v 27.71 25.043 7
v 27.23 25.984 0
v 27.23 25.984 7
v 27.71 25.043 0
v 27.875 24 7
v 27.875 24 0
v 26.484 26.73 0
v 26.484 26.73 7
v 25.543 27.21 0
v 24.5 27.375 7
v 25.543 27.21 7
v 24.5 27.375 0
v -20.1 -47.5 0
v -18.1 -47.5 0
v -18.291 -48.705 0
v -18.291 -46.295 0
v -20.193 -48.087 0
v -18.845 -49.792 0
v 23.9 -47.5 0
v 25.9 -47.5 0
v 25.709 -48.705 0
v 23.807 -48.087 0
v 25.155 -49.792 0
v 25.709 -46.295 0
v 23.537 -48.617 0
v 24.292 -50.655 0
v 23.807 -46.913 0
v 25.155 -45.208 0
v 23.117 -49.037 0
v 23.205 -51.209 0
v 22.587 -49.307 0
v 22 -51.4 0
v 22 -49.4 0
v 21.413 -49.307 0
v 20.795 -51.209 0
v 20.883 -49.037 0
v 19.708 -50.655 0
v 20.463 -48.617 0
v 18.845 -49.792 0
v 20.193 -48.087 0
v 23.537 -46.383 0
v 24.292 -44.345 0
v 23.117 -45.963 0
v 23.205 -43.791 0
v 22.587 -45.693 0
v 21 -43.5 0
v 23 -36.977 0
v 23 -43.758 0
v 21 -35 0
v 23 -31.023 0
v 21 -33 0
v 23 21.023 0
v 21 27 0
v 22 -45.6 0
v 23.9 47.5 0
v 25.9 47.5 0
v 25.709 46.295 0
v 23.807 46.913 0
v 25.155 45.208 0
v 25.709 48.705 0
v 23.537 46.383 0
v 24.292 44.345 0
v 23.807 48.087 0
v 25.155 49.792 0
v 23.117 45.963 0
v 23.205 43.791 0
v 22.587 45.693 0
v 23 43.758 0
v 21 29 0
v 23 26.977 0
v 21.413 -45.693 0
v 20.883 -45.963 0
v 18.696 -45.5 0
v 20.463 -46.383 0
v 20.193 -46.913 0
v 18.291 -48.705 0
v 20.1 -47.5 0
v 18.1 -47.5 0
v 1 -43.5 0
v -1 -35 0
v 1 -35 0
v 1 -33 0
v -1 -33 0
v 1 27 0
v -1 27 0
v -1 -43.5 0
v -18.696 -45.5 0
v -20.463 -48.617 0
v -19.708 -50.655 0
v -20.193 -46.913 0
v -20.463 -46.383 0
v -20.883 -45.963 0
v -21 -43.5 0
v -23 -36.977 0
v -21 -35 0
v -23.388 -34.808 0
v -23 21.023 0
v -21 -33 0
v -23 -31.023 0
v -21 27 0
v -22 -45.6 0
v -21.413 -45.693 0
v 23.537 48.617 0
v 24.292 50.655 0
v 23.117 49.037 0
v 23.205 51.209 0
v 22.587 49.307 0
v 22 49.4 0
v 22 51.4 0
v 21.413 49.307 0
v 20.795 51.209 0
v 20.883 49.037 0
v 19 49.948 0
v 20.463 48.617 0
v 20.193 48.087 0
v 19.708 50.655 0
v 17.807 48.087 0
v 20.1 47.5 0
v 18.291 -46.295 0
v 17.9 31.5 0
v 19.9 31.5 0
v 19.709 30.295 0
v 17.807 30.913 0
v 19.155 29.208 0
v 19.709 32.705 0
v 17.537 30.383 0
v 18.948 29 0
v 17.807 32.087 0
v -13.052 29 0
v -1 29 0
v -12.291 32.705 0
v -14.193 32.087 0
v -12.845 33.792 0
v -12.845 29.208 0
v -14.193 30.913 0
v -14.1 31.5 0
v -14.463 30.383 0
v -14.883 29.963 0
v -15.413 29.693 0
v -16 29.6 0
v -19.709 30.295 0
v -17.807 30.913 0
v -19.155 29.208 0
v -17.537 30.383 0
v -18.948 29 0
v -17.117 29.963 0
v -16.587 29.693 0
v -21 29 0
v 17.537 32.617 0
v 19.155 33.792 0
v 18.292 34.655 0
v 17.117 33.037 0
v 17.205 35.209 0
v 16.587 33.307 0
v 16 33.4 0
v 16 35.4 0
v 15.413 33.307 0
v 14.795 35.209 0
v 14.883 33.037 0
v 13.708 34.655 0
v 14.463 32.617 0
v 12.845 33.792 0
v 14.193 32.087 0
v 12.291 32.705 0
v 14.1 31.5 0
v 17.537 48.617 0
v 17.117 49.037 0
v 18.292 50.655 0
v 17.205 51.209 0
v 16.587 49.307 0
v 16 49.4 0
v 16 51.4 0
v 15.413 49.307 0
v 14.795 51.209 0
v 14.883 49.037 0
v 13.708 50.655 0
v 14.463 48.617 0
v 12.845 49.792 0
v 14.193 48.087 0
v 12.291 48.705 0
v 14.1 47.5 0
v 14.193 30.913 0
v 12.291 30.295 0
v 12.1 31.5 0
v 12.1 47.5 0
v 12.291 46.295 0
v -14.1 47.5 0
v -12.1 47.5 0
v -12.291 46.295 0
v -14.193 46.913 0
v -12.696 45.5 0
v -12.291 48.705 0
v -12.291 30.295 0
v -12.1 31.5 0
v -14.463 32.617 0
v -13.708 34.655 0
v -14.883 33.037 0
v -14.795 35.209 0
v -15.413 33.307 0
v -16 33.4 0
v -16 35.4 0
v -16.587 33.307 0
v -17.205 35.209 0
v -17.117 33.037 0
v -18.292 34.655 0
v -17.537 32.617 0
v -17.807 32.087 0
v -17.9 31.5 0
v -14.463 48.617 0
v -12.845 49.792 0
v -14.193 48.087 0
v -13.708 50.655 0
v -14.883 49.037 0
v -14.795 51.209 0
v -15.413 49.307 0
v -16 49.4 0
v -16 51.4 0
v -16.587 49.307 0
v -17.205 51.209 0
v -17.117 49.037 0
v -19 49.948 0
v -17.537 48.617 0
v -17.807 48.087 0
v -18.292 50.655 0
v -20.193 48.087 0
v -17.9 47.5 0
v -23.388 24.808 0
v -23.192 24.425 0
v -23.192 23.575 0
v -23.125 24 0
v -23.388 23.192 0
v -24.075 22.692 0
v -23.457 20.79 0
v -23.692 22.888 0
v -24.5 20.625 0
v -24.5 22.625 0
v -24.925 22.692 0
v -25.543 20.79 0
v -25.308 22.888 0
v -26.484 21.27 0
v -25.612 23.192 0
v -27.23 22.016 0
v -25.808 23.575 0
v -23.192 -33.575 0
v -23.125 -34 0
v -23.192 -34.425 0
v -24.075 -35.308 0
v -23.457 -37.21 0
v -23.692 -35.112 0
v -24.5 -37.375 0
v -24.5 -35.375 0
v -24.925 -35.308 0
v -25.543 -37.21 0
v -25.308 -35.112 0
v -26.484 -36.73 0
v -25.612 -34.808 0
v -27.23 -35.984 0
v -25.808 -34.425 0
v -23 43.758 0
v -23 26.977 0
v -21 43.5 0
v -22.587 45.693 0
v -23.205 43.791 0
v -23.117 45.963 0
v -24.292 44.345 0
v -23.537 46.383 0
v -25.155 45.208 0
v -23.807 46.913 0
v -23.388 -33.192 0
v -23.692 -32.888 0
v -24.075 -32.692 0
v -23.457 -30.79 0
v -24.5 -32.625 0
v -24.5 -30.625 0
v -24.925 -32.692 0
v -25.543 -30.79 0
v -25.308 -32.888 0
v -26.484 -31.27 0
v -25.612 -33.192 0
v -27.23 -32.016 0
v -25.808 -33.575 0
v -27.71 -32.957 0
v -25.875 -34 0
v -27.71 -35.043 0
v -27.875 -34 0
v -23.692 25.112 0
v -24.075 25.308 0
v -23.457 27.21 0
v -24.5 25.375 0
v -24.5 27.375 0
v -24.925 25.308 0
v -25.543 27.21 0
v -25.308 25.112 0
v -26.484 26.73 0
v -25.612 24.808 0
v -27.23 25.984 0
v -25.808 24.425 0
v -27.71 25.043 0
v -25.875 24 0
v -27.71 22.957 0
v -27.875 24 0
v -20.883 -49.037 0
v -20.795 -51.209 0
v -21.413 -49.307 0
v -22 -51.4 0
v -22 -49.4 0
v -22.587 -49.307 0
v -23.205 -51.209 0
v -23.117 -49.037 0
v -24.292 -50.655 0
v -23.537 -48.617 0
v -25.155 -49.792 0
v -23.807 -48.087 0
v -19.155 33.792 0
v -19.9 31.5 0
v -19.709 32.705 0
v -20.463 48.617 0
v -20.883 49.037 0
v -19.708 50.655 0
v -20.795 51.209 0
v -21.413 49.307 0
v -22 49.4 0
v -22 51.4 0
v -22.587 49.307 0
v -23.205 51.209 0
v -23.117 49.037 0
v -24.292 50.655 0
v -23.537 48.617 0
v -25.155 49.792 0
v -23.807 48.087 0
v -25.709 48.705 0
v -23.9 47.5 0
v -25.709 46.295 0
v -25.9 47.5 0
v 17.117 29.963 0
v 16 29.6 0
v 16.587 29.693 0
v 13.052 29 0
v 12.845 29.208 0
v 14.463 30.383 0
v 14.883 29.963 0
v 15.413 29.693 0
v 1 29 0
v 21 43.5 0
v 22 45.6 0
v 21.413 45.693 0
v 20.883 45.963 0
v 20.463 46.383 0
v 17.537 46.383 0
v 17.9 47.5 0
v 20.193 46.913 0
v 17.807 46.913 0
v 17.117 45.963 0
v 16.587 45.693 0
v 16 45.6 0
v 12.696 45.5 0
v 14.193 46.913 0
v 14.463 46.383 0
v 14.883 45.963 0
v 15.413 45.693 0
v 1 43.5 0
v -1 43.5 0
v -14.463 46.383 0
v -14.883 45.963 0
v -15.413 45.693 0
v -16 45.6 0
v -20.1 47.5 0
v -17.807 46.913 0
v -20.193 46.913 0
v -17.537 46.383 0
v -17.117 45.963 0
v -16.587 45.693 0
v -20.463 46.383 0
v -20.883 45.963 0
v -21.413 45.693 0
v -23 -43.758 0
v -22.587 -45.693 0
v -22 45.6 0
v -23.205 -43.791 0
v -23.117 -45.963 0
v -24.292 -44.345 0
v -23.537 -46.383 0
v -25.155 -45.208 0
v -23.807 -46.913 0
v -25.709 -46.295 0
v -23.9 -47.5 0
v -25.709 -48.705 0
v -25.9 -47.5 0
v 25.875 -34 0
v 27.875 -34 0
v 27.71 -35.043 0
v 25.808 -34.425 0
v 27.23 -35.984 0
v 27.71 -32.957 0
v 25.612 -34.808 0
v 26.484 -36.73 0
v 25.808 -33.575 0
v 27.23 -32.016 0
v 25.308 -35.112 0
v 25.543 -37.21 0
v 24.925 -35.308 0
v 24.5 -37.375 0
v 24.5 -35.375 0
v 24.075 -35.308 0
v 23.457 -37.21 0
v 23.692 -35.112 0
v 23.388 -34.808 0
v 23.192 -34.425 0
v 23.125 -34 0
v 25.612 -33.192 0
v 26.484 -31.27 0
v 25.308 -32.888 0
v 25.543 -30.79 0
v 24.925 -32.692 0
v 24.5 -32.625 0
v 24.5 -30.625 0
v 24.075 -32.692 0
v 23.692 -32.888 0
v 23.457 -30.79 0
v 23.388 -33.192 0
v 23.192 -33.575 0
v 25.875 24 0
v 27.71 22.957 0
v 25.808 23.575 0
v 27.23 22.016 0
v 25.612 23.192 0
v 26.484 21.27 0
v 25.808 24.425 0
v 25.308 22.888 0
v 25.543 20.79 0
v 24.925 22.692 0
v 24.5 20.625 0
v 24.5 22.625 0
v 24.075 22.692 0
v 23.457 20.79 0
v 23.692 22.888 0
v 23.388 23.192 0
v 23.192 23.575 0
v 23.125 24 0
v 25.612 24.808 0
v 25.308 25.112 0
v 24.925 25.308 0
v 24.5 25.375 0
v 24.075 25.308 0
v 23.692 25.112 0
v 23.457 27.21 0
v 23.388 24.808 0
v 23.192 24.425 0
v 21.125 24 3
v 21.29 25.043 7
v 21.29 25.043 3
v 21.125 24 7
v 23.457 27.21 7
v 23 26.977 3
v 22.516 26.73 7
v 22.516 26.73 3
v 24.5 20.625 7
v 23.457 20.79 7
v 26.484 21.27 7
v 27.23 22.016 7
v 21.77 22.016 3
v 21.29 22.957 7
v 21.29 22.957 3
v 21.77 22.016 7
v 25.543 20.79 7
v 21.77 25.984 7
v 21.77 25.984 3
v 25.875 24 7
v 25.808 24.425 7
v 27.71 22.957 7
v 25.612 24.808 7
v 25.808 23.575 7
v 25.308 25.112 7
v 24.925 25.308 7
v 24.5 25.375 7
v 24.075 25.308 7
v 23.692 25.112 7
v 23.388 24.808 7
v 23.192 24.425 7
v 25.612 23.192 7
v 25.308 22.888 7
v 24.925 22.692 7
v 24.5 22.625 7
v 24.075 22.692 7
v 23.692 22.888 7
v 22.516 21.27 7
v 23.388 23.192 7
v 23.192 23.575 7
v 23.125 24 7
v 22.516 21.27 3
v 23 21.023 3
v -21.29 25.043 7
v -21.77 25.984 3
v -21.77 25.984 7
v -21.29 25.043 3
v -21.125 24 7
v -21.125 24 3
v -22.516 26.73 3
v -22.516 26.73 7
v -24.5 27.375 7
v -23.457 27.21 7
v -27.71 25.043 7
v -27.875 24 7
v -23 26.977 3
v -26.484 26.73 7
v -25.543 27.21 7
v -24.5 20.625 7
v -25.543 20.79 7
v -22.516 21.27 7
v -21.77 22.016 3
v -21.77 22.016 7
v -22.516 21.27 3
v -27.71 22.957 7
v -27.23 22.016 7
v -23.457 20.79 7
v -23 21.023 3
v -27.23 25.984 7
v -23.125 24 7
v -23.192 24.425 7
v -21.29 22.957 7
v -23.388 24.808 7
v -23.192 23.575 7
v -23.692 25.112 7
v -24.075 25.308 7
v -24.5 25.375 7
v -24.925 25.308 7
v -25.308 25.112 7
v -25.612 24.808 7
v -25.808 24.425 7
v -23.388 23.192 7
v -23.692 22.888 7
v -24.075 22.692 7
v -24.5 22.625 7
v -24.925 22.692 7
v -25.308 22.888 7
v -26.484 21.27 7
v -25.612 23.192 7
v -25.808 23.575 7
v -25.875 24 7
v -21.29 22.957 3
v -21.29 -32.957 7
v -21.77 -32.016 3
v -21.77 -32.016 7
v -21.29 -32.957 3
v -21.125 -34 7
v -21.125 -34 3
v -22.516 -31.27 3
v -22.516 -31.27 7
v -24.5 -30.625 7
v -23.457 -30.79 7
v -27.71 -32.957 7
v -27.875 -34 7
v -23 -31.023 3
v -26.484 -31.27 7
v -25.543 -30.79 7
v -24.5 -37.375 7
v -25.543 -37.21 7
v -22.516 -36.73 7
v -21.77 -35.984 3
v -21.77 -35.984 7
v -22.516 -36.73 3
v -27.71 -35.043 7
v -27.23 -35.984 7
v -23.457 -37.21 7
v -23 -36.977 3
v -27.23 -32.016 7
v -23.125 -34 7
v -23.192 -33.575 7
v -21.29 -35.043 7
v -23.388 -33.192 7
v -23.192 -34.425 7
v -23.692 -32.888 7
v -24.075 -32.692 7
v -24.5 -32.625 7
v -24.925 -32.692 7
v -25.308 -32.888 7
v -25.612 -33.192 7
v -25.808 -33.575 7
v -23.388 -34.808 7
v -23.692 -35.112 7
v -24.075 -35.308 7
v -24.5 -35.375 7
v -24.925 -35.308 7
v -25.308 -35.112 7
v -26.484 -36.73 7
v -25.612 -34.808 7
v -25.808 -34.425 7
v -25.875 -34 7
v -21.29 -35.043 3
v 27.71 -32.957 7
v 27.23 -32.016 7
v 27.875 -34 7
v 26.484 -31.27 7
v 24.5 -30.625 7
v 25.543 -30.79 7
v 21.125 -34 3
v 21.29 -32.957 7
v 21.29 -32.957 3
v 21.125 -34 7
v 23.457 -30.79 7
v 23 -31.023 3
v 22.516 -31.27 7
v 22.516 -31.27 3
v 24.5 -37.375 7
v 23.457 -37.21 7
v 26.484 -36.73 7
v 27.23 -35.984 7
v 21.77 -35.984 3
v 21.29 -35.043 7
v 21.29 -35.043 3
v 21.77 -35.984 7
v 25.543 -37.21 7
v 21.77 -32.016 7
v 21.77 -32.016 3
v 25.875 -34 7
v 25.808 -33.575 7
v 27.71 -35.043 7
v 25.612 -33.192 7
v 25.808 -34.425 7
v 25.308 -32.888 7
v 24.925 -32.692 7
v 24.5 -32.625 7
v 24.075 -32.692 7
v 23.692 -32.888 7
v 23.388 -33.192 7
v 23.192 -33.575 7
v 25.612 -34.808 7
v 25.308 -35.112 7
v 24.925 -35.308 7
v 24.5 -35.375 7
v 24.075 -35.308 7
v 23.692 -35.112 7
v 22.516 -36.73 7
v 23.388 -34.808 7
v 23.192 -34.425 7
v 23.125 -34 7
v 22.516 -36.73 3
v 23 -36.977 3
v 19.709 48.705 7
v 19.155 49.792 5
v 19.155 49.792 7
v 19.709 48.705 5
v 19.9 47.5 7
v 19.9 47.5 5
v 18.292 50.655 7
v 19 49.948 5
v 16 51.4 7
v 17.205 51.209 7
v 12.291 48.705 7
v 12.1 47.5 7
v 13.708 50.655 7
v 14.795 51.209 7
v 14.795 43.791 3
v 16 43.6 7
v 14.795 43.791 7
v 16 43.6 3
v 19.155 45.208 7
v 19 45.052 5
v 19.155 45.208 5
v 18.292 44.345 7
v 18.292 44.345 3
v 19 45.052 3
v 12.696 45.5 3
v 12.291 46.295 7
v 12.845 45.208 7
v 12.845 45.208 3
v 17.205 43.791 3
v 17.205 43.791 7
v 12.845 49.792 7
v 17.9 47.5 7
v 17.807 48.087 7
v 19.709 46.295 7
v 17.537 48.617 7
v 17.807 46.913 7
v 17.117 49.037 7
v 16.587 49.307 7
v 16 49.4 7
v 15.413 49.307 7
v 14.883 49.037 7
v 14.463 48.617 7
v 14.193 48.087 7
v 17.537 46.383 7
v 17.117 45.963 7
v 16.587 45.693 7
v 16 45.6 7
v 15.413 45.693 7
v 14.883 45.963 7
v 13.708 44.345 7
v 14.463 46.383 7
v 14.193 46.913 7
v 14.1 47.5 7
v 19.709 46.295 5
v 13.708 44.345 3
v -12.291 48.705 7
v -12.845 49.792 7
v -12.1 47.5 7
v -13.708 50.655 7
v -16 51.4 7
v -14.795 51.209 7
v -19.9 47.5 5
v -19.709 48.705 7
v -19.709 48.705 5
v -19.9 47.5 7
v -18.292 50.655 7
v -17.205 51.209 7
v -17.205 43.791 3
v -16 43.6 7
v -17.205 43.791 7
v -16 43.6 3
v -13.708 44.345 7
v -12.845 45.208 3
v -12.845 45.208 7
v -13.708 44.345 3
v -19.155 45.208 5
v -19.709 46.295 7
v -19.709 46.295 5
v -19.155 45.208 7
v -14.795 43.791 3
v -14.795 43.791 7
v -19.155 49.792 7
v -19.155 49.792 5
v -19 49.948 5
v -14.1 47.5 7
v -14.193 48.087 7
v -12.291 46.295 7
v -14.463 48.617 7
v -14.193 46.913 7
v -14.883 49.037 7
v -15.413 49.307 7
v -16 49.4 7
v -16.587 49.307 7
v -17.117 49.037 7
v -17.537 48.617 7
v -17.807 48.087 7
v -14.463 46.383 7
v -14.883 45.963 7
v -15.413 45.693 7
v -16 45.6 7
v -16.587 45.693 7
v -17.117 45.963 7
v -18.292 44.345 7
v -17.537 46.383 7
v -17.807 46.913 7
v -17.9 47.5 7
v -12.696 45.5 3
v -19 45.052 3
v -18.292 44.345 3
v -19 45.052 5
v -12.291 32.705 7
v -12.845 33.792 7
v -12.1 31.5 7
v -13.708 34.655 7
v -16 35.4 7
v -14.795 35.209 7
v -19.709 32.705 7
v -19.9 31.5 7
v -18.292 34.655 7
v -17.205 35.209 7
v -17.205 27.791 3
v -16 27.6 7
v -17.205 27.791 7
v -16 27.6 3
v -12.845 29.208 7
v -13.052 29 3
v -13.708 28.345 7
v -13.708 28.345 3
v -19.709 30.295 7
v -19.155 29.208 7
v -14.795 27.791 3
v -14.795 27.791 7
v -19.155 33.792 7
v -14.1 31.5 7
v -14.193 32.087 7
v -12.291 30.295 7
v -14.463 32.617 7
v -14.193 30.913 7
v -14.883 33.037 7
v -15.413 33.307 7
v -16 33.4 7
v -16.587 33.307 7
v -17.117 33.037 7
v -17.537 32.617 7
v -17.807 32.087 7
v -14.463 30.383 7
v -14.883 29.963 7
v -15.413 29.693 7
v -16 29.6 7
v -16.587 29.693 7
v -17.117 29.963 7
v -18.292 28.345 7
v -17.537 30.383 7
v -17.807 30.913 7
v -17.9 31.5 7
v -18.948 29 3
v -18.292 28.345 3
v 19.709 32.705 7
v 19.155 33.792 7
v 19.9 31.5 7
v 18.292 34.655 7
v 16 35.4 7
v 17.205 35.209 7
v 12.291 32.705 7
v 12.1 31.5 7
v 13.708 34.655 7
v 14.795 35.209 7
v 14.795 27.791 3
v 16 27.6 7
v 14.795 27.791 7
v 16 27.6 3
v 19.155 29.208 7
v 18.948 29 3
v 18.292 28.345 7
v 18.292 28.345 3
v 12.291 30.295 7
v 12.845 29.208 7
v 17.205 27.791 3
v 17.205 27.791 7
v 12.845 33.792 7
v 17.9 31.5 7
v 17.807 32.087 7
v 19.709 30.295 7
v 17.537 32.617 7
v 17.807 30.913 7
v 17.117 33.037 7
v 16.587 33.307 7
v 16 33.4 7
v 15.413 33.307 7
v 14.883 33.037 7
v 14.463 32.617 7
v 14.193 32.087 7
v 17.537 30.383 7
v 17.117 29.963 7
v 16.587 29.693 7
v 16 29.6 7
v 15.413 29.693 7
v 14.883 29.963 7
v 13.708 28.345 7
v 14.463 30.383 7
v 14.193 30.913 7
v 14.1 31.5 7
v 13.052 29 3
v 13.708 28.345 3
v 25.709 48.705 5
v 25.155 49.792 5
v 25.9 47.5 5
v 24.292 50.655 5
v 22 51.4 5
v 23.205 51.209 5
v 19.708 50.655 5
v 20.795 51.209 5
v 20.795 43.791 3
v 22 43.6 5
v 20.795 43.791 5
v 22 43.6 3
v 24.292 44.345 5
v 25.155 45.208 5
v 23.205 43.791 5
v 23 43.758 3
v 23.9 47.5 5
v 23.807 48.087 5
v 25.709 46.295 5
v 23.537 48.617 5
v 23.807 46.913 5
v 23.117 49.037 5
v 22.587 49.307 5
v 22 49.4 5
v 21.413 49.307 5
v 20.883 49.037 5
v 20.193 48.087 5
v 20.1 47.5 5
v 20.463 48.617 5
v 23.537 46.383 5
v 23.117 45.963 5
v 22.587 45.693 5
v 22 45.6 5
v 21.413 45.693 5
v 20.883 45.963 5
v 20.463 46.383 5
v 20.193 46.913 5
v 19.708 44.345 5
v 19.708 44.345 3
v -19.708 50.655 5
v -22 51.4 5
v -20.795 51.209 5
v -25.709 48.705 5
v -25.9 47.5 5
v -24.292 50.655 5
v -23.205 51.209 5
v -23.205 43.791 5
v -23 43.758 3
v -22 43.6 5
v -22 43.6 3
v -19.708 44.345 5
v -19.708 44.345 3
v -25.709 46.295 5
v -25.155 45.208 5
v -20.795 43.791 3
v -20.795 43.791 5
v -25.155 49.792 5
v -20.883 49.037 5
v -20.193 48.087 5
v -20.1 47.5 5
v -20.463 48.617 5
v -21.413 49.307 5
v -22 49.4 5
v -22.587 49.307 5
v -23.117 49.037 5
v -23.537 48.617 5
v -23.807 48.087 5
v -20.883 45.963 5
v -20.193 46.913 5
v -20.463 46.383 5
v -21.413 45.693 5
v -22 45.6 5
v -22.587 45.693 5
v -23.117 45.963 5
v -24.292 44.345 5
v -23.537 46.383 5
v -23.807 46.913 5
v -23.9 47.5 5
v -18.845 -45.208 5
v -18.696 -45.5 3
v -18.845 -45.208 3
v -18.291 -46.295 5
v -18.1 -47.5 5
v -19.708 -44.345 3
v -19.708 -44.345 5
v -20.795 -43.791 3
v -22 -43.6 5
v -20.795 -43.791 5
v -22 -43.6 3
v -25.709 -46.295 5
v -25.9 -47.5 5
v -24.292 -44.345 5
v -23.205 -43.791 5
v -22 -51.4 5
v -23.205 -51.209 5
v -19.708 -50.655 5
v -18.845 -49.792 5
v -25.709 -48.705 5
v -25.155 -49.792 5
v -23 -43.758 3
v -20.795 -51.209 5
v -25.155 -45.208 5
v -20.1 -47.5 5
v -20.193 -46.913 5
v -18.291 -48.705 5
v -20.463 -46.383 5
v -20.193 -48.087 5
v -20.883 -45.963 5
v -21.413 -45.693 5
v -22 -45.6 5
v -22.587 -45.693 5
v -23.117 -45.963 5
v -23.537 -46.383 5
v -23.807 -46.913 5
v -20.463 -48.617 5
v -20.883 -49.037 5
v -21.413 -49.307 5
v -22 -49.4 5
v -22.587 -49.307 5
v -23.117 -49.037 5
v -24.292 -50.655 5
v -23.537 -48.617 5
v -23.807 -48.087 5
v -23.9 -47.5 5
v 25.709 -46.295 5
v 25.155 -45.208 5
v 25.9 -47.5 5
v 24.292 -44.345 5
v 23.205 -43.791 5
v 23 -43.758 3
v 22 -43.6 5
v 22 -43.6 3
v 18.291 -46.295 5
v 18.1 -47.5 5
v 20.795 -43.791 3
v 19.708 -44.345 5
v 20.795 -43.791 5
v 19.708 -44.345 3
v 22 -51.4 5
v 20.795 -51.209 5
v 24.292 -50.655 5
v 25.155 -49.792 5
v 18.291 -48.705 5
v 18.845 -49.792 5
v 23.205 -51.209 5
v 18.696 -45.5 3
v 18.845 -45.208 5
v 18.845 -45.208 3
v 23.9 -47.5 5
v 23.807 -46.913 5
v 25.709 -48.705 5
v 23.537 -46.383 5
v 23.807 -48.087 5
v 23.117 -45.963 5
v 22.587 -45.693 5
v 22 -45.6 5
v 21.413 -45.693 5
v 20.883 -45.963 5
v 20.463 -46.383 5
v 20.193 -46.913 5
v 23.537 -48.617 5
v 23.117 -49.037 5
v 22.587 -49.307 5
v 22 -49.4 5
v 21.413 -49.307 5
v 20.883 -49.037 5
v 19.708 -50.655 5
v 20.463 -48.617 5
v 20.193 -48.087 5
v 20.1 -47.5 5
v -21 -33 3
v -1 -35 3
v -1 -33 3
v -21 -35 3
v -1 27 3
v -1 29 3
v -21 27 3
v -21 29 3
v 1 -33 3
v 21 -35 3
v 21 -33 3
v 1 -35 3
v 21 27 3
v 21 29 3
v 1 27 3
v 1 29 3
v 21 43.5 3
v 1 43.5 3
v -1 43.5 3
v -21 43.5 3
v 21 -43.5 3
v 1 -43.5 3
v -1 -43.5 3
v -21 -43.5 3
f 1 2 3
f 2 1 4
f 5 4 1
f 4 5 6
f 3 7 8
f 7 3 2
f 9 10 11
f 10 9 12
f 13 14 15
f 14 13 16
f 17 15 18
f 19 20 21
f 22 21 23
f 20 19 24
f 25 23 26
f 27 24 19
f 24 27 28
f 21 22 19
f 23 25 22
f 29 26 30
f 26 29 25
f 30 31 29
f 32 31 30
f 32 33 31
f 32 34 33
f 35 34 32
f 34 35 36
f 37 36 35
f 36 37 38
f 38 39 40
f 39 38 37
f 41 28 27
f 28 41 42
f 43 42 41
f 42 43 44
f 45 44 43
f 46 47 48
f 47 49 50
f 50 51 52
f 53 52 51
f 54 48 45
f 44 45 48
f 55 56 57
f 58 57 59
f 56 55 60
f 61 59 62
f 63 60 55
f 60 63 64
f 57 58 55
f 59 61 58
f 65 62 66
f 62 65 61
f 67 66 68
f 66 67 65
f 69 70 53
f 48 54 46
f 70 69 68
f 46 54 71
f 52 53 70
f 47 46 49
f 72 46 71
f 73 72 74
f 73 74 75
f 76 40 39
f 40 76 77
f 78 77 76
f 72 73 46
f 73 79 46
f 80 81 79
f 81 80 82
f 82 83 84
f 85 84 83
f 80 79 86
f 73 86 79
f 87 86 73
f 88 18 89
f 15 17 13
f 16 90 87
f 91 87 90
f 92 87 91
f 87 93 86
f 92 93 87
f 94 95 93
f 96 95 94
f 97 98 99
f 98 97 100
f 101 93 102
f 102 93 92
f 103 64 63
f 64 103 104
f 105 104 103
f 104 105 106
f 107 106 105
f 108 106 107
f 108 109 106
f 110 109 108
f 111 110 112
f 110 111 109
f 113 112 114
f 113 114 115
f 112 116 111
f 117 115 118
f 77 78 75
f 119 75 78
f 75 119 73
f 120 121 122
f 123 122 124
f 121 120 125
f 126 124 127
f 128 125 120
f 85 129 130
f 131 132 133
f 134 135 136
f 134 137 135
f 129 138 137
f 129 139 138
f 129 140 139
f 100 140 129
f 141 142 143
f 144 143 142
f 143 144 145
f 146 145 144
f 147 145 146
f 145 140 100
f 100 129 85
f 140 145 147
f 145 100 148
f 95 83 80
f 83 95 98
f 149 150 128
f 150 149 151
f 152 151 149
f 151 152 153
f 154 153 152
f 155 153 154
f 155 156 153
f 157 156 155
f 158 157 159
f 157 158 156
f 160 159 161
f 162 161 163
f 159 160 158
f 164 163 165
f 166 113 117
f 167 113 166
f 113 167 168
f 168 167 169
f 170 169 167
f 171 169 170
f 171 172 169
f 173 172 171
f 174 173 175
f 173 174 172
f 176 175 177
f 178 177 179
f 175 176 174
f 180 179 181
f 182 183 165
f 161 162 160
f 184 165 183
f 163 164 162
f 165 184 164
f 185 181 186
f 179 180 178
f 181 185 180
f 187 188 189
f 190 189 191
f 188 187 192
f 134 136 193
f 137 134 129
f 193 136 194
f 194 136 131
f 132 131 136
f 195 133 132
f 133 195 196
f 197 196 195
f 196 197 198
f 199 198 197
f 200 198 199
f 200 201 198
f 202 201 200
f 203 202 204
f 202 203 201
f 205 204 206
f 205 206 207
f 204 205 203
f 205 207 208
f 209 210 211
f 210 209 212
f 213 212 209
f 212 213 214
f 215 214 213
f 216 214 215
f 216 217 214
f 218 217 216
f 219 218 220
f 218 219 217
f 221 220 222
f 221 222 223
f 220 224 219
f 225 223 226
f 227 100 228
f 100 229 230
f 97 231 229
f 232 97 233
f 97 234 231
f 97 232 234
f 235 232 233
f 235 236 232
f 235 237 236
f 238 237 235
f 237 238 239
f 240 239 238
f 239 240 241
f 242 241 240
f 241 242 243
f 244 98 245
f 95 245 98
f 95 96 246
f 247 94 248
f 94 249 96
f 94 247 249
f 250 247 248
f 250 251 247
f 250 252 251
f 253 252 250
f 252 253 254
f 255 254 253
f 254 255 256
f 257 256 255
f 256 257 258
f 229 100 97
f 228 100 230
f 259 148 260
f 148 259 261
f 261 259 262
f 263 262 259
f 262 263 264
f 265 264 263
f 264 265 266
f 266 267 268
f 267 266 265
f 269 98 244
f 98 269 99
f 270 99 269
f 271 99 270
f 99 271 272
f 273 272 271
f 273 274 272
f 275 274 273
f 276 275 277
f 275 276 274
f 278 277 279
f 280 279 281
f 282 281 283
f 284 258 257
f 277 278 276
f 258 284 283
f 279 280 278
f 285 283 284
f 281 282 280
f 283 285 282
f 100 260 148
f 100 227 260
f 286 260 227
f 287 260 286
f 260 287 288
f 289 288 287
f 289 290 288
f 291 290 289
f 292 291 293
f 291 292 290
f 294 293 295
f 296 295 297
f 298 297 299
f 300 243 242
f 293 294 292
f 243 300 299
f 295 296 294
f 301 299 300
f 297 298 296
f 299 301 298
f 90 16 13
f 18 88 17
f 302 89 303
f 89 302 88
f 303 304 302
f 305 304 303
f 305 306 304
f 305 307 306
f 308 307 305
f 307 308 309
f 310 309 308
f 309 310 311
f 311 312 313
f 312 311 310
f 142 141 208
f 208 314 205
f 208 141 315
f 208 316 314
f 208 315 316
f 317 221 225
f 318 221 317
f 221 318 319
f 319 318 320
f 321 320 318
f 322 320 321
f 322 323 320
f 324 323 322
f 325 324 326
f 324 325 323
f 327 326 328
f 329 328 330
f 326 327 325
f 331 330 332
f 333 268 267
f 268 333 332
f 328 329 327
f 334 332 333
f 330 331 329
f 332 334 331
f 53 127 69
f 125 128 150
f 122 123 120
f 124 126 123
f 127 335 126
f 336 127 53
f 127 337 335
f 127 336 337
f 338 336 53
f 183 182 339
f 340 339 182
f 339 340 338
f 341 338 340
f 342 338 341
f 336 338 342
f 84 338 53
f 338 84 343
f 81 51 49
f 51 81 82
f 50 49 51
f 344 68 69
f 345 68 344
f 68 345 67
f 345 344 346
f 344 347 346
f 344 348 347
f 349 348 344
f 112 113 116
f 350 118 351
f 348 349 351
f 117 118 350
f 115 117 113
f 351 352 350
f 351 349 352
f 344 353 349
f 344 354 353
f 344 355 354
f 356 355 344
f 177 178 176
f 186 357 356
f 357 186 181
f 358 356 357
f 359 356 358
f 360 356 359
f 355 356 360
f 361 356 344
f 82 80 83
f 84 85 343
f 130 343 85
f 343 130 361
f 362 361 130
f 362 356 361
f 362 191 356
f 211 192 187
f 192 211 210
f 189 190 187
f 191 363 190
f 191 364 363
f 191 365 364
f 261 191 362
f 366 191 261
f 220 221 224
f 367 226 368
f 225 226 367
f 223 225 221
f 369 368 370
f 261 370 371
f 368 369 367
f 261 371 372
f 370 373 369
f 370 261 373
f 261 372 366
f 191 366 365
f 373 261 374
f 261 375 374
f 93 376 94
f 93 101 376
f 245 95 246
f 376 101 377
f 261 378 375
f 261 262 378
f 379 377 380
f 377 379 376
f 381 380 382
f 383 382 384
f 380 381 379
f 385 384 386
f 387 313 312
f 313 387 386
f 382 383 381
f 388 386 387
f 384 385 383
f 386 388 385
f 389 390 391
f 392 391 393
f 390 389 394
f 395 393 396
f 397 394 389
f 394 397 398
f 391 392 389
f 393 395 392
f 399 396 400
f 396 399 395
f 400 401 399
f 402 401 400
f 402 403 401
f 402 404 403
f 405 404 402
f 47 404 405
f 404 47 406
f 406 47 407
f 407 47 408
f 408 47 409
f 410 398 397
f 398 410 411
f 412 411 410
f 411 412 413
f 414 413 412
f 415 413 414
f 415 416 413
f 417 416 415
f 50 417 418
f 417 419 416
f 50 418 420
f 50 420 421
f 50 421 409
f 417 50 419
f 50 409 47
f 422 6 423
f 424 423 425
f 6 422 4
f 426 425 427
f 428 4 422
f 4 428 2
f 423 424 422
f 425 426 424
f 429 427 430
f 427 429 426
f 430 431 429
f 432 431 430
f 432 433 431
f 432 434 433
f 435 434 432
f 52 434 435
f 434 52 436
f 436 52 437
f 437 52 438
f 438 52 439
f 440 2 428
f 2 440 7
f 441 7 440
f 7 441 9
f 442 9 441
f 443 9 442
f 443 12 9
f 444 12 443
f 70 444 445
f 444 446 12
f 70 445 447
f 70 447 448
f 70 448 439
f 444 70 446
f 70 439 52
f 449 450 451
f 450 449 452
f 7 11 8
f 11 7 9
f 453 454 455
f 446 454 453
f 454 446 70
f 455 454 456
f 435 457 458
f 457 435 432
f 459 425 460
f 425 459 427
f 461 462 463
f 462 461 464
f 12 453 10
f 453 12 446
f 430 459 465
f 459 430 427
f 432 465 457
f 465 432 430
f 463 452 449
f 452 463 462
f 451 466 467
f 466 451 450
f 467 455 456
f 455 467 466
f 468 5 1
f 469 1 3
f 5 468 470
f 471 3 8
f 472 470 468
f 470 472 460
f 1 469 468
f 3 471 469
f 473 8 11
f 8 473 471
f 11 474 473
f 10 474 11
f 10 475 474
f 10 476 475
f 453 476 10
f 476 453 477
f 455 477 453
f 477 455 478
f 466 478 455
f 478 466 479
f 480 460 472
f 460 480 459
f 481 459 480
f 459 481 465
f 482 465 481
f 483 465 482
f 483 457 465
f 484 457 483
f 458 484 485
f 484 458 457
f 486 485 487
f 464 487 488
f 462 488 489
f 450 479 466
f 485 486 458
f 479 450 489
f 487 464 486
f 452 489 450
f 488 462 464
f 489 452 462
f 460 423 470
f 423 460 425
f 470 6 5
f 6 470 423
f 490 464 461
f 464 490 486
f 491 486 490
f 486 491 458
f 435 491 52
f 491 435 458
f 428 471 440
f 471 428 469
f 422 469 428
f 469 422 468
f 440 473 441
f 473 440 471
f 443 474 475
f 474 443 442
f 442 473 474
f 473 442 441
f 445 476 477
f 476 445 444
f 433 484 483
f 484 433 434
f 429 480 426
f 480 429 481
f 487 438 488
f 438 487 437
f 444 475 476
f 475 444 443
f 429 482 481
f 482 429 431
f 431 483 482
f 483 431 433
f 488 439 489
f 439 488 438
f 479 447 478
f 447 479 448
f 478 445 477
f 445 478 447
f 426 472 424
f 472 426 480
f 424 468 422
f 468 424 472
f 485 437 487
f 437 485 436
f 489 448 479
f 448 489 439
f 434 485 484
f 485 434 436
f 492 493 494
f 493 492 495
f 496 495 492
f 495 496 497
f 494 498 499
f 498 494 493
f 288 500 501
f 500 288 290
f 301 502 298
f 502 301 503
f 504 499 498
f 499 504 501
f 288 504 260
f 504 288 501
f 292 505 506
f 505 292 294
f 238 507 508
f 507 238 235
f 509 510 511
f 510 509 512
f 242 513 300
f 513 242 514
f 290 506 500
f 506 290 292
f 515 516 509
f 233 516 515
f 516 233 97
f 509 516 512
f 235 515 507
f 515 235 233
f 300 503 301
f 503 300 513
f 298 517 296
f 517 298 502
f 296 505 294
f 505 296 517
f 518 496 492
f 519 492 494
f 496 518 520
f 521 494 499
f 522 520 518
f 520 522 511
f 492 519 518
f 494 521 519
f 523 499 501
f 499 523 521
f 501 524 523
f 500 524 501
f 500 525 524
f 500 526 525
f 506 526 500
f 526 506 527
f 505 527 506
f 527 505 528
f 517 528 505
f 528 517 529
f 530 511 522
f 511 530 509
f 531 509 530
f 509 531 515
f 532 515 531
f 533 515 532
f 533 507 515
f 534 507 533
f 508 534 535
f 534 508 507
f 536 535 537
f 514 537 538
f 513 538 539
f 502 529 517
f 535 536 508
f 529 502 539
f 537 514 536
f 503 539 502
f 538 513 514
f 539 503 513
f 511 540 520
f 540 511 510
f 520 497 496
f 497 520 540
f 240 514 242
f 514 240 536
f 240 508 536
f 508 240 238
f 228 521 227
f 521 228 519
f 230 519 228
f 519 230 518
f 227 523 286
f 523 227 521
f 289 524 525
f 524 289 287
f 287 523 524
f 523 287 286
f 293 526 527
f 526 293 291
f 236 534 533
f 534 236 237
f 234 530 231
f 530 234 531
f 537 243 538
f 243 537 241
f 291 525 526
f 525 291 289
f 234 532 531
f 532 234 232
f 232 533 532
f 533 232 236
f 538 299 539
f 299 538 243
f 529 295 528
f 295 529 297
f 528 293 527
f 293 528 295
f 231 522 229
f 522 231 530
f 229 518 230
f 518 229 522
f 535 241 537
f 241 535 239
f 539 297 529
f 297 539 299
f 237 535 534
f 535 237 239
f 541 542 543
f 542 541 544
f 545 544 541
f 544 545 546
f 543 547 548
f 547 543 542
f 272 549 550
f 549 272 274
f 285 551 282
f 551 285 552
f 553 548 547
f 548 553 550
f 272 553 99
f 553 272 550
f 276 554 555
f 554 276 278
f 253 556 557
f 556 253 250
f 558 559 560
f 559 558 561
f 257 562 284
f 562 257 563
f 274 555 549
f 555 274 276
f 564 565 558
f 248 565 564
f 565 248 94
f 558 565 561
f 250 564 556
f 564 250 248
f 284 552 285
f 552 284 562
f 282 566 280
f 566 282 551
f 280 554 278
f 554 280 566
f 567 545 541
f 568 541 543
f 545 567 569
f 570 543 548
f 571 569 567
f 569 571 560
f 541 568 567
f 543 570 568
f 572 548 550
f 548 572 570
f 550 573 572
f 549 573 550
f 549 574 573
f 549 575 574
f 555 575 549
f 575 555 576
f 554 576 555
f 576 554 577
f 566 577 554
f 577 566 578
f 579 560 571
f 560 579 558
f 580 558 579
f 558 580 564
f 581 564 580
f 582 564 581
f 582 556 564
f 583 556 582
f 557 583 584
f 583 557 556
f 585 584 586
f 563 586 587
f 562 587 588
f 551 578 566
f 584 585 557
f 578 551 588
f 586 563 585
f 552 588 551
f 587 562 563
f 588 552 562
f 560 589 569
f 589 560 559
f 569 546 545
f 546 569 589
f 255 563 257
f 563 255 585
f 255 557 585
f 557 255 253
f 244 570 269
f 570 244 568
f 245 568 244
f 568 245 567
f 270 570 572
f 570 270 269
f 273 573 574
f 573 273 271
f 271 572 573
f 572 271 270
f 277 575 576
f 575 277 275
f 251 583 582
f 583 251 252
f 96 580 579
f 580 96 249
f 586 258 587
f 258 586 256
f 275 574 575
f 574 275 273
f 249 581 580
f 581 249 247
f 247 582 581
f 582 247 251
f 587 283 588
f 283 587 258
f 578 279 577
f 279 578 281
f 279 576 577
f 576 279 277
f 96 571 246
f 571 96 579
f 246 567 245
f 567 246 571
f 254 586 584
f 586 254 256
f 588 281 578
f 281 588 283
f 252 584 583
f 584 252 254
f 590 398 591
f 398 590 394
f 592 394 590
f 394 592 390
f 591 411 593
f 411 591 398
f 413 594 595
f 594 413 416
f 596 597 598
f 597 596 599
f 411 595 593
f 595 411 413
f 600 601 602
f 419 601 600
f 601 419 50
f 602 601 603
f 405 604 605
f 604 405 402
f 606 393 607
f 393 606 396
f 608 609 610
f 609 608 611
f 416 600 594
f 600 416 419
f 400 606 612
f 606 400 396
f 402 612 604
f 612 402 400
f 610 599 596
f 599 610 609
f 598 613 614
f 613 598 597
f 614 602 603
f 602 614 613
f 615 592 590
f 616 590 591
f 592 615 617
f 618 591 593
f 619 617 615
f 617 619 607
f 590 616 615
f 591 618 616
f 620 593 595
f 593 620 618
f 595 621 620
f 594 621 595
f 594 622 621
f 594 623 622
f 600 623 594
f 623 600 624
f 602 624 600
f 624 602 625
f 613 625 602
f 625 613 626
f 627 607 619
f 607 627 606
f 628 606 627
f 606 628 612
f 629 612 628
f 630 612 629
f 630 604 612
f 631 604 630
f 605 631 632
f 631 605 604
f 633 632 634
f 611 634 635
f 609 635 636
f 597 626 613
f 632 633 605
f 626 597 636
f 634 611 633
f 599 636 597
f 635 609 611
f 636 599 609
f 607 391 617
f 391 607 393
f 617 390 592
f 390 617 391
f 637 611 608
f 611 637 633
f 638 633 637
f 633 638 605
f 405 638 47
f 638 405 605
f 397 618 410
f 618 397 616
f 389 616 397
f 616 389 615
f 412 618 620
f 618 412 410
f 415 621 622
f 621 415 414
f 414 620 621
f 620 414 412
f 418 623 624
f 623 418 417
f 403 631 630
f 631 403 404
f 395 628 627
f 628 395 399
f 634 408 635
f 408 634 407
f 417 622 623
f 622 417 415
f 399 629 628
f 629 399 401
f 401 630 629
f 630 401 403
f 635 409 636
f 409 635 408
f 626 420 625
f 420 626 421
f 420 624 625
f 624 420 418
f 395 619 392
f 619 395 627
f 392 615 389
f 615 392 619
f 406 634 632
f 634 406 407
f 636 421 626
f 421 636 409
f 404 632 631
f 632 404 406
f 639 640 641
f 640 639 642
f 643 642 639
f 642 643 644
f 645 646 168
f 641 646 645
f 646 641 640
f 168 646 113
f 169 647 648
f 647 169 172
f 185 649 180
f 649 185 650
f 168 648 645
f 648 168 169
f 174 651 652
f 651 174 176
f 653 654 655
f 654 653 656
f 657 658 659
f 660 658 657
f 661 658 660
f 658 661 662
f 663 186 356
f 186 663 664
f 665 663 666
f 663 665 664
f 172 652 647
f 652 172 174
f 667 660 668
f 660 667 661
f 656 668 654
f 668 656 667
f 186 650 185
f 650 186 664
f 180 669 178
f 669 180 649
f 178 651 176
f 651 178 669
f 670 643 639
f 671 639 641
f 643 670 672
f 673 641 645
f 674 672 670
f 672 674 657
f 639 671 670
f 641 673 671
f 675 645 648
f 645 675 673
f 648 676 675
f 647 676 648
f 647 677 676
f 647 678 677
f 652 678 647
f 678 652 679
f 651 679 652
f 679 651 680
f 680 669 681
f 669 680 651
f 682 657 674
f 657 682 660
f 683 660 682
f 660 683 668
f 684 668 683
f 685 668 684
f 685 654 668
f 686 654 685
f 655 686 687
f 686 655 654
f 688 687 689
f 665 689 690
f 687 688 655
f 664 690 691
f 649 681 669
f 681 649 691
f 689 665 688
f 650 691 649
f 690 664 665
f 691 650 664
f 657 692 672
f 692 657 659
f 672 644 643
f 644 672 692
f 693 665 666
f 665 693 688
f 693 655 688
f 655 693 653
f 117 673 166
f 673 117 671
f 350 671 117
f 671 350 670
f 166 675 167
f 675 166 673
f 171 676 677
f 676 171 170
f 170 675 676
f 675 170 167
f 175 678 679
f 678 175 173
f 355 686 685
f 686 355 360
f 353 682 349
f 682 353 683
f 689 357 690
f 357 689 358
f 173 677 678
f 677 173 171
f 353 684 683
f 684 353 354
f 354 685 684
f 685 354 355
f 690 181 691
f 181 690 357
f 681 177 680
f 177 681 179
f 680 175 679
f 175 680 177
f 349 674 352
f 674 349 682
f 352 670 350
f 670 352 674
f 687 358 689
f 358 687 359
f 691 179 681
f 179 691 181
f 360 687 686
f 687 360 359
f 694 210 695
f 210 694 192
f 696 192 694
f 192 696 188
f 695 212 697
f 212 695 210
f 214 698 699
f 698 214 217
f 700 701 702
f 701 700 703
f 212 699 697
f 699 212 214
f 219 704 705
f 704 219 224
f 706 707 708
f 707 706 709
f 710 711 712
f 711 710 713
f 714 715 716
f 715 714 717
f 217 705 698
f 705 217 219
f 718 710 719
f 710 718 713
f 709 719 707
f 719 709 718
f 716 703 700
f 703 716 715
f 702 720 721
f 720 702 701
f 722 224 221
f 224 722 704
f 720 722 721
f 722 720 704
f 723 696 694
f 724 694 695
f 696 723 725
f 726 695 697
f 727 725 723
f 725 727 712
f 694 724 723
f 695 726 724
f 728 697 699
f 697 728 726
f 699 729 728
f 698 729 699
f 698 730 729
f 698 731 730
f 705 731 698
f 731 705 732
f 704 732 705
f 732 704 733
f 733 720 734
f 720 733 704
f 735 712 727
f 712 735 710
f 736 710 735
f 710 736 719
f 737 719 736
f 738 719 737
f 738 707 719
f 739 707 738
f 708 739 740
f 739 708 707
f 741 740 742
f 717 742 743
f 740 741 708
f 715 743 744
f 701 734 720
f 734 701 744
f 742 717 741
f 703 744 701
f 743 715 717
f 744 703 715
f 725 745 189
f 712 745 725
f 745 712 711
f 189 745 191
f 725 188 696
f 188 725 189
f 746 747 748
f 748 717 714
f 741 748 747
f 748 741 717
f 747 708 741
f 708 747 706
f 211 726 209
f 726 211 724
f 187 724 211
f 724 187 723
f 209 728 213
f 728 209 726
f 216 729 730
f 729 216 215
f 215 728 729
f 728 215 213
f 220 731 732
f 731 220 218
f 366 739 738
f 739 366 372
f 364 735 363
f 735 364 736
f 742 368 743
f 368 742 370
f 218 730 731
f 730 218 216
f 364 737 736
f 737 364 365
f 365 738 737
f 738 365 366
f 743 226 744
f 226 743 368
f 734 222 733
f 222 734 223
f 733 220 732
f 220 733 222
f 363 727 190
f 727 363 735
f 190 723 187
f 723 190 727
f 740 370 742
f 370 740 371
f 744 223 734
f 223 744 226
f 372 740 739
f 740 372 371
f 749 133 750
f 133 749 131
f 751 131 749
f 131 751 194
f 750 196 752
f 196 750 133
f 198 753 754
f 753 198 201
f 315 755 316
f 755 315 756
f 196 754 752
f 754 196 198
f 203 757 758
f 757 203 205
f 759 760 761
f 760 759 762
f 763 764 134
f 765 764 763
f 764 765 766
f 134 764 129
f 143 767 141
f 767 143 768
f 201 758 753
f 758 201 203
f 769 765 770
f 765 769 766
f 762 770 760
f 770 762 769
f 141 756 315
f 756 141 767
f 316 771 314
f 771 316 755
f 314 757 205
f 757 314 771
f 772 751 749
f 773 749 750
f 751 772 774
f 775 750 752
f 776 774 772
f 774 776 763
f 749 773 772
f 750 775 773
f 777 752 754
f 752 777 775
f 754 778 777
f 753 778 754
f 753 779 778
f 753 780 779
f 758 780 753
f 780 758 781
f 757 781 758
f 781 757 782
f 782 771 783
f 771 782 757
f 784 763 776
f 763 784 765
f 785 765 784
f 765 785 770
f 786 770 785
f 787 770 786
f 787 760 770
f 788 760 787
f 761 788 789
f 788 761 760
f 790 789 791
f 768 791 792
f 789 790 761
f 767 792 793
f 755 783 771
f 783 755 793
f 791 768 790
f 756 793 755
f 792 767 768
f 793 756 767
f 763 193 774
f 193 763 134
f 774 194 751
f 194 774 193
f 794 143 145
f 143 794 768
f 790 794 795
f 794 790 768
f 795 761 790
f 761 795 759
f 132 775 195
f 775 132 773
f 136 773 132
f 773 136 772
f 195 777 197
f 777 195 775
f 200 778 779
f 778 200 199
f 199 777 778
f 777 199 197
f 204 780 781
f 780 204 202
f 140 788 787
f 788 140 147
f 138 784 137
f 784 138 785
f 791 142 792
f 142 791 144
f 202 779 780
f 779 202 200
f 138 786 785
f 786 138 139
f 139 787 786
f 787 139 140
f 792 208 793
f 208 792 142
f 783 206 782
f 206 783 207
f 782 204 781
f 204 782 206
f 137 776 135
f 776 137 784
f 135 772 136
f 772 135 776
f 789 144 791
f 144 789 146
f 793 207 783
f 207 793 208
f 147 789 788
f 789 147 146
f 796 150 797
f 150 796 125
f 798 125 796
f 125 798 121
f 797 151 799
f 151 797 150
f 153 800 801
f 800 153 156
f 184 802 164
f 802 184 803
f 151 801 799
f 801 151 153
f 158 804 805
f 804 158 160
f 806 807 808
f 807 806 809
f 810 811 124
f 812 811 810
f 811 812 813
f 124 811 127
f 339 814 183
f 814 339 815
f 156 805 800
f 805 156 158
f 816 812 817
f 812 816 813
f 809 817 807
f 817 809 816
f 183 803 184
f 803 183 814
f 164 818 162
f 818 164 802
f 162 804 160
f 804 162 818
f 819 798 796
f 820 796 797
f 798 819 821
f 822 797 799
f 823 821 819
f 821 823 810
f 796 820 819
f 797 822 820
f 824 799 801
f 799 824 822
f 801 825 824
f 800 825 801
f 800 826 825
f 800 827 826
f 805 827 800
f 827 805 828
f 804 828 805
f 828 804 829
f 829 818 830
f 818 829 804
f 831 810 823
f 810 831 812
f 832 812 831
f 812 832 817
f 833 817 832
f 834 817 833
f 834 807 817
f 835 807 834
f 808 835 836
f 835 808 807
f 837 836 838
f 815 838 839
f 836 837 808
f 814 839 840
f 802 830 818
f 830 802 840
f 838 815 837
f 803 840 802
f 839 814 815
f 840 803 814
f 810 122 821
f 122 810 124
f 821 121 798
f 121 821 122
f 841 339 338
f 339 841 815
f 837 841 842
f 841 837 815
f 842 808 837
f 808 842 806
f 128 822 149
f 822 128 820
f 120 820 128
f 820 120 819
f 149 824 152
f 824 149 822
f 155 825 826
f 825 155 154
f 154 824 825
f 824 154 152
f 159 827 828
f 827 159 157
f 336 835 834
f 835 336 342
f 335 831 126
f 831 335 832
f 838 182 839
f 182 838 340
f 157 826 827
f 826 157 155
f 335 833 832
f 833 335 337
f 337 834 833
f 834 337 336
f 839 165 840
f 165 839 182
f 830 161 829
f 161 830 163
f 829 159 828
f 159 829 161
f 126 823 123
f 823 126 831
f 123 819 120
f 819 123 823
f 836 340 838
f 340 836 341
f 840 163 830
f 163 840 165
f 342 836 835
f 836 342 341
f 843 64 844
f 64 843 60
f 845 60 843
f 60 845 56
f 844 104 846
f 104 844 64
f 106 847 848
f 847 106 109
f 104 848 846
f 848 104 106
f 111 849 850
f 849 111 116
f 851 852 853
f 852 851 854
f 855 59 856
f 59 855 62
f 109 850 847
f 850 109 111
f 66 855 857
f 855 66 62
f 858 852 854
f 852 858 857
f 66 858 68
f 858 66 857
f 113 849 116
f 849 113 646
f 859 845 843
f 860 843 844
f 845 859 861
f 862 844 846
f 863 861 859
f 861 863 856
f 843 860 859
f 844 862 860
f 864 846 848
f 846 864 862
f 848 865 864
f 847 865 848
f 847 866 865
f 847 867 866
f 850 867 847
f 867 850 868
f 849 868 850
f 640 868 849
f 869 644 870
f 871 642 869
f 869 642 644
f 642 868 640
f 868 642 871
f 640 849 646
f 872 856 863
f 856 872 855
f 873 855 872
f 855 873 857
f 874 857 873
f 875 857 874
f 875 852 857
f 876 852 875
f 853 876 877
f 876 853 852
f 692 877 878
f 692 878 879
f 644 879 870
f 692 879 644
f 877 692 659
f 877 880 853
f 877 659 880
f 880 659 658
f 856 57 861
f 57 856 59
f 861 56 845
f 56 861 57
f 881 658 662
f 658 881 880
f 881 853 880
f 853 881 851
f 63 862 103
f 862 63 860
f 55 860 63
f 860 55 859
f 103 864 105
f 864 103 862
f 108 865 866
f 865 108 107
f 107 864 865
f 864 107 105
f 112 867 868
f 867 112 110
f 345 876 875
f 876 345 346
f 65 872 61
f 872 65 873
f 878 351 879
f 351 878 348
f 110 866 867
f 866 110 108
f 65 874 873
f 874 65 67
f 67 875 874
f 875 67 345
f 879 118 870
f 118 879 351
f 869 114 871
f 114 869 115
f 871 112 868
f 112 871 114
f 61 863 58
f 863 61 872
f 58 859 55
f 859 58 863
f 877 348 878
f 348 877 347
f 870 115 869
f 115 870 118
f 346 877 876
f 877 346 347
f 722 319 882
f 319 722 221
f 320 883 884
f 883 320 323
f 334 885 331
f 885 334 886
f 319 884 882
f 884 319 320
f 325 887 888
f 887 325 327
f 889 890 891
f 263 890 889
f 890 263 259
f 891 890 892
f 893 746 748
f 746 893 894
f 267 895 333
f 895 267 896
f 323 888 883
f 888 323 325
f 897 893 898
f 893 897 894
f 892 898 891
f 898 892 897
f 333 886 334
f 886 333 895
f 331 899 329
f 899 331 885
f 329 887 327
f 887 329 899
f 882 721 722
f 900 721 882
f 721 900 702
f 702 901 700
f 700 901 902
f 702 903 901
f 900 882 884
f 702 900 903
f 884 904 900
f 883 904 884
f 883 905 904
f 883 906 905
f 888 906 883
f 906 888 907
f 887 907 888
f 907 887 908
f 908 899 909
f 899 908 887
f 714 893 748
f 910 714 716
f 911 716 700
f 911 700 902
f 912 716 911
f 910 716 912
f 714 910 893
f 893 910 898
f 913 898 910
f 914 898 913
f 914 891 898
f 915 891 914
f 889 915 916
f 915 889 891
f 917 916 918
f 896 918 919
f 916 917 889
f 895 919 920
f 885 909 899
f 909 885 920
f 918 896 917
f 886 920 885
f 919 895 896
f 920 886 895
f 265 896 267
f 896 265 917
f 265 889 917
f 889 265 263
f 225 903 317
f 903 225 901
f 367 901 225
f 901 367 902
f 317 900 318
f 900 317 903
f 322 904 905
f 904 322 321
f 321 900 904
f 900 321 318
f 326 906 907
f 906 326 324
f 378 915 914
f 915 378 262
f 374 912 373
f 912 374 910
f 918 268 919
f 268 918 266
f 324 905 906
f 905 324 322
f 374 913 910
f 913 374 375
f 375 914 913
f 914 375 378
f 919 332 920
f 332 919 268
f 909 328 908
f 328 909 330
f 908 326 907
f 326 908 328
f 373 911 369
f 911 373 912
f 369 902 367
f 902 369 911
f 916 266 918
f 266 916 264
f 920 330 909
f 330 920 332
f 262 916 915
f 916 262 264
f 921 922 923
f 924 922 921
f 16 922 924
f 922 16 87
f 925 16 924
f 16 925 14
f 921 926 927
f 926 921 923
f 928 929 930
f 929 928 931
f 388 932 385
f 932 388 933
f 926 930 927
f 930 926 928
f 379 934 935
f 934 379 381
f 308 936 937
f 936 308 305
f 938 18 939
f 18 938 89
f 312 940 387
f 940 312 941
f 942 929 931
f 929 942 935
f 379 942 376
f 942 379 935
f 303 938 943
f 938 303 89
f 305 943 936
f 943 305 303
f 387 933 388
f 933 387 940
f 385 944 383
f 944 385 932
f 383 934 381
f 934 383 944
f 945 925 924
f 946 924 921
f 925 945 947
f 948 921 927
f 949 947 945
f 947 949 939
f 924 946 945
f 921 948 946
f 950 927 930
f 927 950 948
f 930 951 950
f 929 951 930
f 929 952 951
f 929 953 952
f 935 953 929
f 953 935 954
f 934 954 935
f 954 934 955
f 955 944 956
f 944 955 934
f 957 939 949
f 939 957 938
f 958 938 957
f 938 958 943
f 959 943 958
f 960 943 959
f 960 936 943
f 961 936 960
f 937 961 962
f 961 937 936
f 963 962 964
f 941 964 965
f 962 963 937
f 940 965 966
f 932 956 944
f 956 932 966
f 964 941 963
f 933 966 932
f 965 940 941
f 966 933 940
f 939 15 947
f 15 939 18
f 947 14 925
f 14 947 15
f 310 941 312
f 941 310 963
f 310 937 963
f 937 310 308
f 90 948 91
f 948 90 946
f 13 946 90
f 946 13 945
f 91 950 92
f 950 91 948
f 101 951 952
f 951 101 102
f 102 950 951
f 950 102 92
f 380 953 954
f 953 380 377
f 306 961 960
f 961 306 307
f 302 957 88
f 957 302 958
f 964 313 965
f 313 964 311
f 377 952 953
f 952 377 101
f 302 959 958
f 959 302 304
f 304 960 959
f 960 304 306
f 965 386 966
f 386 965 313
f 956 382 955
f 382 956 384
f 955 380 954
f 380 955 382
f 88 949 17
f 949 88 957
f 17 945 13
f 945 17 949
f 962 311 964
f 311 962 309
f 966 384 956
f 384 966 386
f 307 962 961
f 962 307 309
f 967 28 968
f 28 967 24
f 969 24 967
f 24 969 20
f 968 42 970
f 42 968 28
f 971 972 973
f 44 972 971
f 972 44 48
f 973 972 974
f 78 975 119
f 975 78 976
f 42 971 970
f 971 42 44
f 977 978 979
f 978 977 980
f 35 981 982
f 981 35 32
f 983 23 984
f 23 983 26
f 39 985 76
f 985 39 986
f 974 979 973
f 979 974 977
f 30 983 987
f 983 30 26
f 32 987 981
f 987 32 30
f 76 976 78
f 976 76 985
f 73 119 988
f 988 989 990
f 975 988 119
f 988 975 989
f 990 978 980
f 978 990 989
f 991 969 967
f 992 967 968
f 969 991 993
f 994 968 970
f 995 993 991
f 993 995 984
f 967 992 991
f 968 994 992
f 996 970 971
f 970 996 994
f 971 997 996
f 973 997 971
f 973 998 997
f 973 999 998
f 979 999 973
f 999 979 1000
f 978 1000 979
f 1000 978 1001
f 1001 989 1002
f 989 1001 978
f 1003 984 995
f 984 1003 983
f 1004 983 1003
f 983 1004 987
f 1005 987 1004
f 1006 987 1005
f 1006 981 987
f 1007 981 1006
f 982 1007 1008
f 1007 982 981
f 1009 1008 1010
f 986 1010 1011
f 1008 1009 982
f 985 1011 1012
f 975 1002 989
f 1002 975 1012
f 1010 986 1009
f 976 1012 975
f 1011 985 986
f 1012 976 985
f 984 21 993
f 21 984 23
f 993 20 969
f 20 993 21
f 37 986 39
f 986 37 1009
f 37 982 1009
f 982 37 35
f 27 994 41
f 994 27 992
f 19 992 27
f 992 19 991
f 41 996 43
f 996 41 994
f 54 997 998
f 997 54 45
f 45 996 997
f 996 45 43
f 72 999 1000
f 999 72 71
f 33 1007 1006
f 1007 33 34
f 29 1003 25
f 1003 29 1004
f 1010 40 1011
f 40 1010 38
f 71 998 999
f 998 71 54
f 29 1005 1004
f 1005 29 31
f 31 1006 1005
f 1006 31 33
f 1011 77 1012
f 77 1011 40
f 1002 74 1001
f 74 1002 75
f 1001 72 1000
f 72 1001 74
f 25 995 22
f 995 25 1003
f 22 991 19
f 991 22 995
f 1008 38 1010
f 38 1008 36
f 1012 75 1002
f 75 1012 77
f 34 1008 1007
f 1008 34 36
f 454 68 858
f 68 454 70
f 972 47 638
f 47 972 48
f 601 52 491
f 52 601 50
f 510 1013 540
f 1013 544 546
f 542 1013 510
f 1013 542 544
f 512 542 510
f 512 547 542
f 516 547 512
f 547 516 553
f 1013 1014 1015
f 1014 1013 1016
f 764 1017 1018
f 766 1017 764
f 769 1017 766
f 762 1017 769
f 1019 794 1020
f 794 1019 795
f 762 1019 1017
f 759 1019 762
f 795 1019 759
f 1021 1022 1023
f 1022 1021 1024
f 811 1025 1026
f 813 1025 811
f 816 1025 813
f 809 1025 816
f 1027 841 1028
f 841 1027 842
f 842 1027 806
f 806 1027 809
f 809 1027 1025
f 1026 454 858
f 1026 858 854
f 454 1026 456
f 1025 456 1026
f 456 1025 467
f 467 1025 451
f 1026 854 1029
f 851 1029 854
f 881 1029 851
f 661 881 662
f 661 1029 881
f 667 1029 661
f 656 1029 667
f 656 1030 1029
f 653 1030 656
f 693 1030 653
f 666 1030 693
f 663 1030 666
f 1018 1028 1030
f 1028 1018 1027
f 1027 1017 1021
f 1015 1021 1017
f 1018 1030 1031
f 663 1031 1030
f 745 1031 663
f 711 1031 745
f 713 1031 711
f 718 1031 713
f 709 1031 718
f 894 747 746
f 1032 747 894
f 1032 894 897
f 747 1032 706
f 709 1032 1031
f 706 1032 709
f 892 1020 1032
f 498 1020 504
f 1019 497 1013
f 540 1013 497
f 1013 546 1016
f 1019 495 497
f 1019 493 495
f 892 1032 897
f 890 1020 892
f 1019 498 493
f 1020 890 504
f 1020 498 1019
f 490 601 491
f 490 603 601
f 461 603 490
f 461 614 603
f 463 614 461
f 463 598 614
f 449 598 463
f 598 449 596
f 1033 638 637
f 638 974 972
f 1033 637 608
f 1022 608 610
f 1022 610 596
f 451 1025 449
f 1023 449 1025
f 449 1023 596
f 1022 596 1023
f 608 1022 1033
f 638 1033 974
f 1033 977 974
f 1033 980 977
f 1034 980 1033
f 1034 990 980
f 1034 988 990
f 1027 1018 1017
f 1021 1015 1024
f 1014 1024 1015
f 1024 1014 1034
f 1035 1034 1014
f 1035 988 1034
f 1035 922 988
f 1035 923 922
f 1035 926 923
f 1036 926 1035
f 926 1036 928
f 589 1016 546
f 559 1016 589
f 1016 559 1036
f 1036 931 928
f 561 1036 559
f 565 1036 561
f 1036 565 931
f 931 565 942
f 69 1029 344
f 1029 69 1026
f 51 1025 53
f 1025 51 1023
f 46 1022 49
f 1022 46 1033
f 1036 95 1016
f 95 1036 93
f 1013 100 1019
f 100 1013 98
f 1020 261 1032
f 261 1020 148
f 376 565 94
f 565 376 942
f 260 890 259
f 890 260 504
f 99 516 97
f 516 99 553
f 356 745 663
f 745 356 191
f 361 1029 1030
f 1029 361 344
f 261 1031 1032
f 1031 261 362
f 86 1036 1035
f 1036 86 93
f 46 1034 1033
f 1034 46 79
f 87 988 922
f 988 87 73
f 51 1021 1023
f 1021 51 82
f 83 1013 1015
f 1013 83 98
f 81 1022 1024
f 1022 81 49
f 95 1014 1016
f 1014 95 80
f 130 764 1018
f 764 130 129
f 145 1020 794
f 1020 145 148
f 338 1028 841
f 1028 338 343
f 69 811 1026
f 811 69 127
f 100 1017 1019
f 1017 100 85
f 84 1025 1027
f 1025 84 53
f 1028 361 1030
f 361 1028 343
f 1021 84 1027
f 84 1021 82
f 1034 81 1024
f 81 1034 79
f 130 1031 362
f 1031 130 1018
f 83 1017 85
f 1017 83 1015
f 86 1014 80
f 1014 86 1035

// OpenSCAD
$fn = 20;

Screw_Mounting_Thickness = 4;

PI_Screw_Length = 58;
PI_Screw_Width = 49;
PI_Screw_Diameter = 2.75;
PI_Screw_Height = 7;

HIK_Screw_Length = 95;
HIK_Screw_Width = 44;
HIK_Screw_Diameter = 3.8;
HIK_Screw_Height = 5;

Buck_Screw_Length = 16;
Buck_Screw_Width = 32;
Buck_Screw_Diameter = 3.8;
Buck_Screw_Height = 7;

Mount_Platform_Length = 89;
Mount_Platform_Width = 44;
Mount_Platform_Thickness_Height = 3;
Mount_Platform_Thickness_Width = 2;

module Screw_Column (screwdiameter, screwheight, thickness){
    difference (){
        cylinder(d = screwdiameter+thickness, h = screwheight, center=true);
        cylinder(d = screwdiameter, h = screwheight+1, center=true);
    }
}

// Create Screw Mounts
module Screw_Mounts (w, l, h, d, t){
    translate ([w/2, l/2,0])
        Screw_Column (d, h, t); 
    translate ([-w/2, l/2,0])
        Screw_Column (d, h, t); 
    translate ([-w/2, -l/2,0])
        Screw_Column (d, h, t); 
    translate ([w/2, -l/2,0])
        Screw_Column (d, h, t); 
}

module Mount_Platform (l, w, th, tw){
    translate([w/2,0,0])
        cube([tw,l,th], center=true);
    translate([-w/2,0,0])
        cube([tw,l,th], center=true);
    translate([0,l/2,0])
        cube([w,tw,th], center=true);
    translate([0,-l/2,0])
        cube([w,tw,th], center=true);
    translate([0,-34,0])  
        cube([w,tw,th], center=true);
    translate([0,28,0])  
        cube([w,tw,th], center=true);
    cube([tw,l,th], center=true);

}

// PI 1 mounting screw Columns
translate([0,-5,PI_Screw_Height/2])
Screw_Mounts(
    PI_Screw_Width, 
    PI_Screw_Length, 
    PI_Screw_Height,
    PI_Screw_Diameter,
    Screw_Mounting_Thickness);

// Buck mounting screw Columns
translate([0,(HIK_Screw_Length/2)-(Buck_Screw_Length/2),Buck_Screw_Height/2])
Screw_Mounts(
    Buck_Screw_Width, 
    Buck_Screw_Length, 
    Buck_Screw_Height,
    Buck_Screw_Diameter,
    Screw_Mounting_Thickness);

// HIK mounting screw Columns
translate([0,0,HIK_Screw_Height/2])
Screw_Mounts(
    HIK_Screw_Width, 
    HIK_Screw_Length, 
    HIK_Screw_Height,
    HIK_Screw_Diameter,
    Screw_Mounting_Thickness);

translate([0,0,Mount_Platform_Thickness_Height/2])
Mount_Platform (
    Mount_Platform_Length, 
    Mount_Platform_Width, 
    Mount_Platform_Thickness_Height, 
    Mount_Platform_Thickness_Width);
